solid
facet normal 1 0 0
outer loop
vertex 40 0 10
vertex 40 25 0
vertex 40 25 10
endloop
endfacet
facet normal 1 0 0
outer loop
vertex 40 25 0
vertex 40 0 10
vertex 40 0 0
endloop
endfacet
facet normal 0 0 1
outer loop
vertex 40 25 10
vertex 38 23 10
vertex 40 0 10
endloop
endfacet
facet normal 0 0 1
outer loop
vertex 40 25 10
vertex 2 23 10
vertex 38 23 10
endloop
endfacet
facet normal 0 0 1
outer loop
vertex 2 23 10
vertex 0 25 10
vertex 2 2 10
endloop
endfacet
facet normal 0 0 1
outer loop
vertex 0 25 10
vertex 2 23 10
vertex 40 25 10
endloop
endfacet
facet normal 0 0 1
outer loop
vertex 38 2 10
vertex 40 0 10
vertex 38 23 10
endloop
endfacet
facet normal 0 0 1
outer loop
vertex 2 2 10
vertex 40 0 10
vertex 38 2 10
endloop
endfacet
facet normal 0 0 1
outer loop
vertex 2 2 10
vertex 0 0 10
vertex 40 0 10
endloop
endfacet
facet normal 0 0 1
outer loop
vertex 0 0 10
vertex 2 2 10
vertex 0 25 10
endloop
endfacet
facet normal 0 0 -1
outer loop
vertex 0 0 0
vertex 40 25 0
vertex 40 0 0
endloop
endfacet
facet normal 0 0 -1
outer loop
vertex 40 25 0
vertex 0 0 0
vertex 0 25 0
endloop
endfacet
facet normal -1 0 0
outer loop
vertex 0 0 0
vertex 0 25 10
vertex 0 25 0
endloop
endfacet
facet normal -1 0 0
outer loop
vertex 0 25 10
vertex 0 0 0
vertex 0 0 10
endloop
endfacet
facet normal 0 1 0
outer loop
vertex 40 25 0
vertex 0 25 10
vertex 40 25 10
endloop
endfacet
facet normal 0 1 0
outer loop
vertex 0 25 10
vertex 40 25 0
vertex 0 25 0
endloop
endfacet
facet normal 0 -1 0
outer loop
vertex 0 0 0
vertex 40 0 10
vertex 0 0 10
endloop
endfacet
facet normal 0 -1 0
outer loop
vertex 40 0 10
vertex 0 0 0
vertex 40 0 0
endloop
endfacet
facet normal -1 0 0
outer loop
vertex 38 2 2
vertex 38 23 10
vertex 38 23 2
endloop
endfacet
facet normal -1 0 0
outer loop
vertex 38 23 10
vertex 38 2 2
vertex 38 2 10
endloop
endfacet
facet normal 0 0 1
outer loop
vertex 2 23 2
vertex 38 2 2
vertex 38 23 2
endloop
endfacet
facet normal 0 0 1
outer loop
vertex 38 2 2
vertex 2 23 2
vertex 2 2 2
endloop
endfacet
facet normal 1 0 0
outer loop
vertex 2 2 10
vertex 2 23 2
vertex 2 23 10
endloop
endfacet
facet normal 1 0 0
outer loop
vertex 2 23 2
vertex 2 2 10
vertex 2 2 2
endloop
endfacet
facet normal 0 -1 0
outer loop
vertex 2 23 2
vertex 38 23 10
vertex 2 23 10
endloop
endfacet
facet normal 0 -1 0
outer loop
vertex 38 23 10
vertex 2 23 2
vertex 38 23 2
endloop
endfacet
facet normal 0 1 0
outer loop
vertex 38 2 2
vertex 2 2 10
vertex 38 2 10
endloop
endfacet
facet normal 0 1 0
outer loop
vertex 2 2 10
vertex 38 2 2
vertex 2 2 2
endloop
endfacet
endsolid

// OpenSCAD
// TEMPLATE: copy this folder, rename it, edit.
// Build: python scripts/build_part.py printer/<name>
//
// Rules: millimetres, parameters first, part sits on z=0 in print orientation.
// Libraries (after scripts/fetch_libs.py):
//   include <BOSL2/std.scad>

/* [Size] */
width  = 40;
depth  = 25;
height = 10;
wall   = 2;      // >= 2 perimeters of a 0.4 nozzle

/* [Fit] */
clearance = 0.2; // per side, for parts that slide together; tune after a test print

$fn = 64;

difference() {
    cube([width, depth, height]);
    translate([wall, wall, wall])
        cube([width - 2 * wall, depth - 2 * wall, height]);
}
